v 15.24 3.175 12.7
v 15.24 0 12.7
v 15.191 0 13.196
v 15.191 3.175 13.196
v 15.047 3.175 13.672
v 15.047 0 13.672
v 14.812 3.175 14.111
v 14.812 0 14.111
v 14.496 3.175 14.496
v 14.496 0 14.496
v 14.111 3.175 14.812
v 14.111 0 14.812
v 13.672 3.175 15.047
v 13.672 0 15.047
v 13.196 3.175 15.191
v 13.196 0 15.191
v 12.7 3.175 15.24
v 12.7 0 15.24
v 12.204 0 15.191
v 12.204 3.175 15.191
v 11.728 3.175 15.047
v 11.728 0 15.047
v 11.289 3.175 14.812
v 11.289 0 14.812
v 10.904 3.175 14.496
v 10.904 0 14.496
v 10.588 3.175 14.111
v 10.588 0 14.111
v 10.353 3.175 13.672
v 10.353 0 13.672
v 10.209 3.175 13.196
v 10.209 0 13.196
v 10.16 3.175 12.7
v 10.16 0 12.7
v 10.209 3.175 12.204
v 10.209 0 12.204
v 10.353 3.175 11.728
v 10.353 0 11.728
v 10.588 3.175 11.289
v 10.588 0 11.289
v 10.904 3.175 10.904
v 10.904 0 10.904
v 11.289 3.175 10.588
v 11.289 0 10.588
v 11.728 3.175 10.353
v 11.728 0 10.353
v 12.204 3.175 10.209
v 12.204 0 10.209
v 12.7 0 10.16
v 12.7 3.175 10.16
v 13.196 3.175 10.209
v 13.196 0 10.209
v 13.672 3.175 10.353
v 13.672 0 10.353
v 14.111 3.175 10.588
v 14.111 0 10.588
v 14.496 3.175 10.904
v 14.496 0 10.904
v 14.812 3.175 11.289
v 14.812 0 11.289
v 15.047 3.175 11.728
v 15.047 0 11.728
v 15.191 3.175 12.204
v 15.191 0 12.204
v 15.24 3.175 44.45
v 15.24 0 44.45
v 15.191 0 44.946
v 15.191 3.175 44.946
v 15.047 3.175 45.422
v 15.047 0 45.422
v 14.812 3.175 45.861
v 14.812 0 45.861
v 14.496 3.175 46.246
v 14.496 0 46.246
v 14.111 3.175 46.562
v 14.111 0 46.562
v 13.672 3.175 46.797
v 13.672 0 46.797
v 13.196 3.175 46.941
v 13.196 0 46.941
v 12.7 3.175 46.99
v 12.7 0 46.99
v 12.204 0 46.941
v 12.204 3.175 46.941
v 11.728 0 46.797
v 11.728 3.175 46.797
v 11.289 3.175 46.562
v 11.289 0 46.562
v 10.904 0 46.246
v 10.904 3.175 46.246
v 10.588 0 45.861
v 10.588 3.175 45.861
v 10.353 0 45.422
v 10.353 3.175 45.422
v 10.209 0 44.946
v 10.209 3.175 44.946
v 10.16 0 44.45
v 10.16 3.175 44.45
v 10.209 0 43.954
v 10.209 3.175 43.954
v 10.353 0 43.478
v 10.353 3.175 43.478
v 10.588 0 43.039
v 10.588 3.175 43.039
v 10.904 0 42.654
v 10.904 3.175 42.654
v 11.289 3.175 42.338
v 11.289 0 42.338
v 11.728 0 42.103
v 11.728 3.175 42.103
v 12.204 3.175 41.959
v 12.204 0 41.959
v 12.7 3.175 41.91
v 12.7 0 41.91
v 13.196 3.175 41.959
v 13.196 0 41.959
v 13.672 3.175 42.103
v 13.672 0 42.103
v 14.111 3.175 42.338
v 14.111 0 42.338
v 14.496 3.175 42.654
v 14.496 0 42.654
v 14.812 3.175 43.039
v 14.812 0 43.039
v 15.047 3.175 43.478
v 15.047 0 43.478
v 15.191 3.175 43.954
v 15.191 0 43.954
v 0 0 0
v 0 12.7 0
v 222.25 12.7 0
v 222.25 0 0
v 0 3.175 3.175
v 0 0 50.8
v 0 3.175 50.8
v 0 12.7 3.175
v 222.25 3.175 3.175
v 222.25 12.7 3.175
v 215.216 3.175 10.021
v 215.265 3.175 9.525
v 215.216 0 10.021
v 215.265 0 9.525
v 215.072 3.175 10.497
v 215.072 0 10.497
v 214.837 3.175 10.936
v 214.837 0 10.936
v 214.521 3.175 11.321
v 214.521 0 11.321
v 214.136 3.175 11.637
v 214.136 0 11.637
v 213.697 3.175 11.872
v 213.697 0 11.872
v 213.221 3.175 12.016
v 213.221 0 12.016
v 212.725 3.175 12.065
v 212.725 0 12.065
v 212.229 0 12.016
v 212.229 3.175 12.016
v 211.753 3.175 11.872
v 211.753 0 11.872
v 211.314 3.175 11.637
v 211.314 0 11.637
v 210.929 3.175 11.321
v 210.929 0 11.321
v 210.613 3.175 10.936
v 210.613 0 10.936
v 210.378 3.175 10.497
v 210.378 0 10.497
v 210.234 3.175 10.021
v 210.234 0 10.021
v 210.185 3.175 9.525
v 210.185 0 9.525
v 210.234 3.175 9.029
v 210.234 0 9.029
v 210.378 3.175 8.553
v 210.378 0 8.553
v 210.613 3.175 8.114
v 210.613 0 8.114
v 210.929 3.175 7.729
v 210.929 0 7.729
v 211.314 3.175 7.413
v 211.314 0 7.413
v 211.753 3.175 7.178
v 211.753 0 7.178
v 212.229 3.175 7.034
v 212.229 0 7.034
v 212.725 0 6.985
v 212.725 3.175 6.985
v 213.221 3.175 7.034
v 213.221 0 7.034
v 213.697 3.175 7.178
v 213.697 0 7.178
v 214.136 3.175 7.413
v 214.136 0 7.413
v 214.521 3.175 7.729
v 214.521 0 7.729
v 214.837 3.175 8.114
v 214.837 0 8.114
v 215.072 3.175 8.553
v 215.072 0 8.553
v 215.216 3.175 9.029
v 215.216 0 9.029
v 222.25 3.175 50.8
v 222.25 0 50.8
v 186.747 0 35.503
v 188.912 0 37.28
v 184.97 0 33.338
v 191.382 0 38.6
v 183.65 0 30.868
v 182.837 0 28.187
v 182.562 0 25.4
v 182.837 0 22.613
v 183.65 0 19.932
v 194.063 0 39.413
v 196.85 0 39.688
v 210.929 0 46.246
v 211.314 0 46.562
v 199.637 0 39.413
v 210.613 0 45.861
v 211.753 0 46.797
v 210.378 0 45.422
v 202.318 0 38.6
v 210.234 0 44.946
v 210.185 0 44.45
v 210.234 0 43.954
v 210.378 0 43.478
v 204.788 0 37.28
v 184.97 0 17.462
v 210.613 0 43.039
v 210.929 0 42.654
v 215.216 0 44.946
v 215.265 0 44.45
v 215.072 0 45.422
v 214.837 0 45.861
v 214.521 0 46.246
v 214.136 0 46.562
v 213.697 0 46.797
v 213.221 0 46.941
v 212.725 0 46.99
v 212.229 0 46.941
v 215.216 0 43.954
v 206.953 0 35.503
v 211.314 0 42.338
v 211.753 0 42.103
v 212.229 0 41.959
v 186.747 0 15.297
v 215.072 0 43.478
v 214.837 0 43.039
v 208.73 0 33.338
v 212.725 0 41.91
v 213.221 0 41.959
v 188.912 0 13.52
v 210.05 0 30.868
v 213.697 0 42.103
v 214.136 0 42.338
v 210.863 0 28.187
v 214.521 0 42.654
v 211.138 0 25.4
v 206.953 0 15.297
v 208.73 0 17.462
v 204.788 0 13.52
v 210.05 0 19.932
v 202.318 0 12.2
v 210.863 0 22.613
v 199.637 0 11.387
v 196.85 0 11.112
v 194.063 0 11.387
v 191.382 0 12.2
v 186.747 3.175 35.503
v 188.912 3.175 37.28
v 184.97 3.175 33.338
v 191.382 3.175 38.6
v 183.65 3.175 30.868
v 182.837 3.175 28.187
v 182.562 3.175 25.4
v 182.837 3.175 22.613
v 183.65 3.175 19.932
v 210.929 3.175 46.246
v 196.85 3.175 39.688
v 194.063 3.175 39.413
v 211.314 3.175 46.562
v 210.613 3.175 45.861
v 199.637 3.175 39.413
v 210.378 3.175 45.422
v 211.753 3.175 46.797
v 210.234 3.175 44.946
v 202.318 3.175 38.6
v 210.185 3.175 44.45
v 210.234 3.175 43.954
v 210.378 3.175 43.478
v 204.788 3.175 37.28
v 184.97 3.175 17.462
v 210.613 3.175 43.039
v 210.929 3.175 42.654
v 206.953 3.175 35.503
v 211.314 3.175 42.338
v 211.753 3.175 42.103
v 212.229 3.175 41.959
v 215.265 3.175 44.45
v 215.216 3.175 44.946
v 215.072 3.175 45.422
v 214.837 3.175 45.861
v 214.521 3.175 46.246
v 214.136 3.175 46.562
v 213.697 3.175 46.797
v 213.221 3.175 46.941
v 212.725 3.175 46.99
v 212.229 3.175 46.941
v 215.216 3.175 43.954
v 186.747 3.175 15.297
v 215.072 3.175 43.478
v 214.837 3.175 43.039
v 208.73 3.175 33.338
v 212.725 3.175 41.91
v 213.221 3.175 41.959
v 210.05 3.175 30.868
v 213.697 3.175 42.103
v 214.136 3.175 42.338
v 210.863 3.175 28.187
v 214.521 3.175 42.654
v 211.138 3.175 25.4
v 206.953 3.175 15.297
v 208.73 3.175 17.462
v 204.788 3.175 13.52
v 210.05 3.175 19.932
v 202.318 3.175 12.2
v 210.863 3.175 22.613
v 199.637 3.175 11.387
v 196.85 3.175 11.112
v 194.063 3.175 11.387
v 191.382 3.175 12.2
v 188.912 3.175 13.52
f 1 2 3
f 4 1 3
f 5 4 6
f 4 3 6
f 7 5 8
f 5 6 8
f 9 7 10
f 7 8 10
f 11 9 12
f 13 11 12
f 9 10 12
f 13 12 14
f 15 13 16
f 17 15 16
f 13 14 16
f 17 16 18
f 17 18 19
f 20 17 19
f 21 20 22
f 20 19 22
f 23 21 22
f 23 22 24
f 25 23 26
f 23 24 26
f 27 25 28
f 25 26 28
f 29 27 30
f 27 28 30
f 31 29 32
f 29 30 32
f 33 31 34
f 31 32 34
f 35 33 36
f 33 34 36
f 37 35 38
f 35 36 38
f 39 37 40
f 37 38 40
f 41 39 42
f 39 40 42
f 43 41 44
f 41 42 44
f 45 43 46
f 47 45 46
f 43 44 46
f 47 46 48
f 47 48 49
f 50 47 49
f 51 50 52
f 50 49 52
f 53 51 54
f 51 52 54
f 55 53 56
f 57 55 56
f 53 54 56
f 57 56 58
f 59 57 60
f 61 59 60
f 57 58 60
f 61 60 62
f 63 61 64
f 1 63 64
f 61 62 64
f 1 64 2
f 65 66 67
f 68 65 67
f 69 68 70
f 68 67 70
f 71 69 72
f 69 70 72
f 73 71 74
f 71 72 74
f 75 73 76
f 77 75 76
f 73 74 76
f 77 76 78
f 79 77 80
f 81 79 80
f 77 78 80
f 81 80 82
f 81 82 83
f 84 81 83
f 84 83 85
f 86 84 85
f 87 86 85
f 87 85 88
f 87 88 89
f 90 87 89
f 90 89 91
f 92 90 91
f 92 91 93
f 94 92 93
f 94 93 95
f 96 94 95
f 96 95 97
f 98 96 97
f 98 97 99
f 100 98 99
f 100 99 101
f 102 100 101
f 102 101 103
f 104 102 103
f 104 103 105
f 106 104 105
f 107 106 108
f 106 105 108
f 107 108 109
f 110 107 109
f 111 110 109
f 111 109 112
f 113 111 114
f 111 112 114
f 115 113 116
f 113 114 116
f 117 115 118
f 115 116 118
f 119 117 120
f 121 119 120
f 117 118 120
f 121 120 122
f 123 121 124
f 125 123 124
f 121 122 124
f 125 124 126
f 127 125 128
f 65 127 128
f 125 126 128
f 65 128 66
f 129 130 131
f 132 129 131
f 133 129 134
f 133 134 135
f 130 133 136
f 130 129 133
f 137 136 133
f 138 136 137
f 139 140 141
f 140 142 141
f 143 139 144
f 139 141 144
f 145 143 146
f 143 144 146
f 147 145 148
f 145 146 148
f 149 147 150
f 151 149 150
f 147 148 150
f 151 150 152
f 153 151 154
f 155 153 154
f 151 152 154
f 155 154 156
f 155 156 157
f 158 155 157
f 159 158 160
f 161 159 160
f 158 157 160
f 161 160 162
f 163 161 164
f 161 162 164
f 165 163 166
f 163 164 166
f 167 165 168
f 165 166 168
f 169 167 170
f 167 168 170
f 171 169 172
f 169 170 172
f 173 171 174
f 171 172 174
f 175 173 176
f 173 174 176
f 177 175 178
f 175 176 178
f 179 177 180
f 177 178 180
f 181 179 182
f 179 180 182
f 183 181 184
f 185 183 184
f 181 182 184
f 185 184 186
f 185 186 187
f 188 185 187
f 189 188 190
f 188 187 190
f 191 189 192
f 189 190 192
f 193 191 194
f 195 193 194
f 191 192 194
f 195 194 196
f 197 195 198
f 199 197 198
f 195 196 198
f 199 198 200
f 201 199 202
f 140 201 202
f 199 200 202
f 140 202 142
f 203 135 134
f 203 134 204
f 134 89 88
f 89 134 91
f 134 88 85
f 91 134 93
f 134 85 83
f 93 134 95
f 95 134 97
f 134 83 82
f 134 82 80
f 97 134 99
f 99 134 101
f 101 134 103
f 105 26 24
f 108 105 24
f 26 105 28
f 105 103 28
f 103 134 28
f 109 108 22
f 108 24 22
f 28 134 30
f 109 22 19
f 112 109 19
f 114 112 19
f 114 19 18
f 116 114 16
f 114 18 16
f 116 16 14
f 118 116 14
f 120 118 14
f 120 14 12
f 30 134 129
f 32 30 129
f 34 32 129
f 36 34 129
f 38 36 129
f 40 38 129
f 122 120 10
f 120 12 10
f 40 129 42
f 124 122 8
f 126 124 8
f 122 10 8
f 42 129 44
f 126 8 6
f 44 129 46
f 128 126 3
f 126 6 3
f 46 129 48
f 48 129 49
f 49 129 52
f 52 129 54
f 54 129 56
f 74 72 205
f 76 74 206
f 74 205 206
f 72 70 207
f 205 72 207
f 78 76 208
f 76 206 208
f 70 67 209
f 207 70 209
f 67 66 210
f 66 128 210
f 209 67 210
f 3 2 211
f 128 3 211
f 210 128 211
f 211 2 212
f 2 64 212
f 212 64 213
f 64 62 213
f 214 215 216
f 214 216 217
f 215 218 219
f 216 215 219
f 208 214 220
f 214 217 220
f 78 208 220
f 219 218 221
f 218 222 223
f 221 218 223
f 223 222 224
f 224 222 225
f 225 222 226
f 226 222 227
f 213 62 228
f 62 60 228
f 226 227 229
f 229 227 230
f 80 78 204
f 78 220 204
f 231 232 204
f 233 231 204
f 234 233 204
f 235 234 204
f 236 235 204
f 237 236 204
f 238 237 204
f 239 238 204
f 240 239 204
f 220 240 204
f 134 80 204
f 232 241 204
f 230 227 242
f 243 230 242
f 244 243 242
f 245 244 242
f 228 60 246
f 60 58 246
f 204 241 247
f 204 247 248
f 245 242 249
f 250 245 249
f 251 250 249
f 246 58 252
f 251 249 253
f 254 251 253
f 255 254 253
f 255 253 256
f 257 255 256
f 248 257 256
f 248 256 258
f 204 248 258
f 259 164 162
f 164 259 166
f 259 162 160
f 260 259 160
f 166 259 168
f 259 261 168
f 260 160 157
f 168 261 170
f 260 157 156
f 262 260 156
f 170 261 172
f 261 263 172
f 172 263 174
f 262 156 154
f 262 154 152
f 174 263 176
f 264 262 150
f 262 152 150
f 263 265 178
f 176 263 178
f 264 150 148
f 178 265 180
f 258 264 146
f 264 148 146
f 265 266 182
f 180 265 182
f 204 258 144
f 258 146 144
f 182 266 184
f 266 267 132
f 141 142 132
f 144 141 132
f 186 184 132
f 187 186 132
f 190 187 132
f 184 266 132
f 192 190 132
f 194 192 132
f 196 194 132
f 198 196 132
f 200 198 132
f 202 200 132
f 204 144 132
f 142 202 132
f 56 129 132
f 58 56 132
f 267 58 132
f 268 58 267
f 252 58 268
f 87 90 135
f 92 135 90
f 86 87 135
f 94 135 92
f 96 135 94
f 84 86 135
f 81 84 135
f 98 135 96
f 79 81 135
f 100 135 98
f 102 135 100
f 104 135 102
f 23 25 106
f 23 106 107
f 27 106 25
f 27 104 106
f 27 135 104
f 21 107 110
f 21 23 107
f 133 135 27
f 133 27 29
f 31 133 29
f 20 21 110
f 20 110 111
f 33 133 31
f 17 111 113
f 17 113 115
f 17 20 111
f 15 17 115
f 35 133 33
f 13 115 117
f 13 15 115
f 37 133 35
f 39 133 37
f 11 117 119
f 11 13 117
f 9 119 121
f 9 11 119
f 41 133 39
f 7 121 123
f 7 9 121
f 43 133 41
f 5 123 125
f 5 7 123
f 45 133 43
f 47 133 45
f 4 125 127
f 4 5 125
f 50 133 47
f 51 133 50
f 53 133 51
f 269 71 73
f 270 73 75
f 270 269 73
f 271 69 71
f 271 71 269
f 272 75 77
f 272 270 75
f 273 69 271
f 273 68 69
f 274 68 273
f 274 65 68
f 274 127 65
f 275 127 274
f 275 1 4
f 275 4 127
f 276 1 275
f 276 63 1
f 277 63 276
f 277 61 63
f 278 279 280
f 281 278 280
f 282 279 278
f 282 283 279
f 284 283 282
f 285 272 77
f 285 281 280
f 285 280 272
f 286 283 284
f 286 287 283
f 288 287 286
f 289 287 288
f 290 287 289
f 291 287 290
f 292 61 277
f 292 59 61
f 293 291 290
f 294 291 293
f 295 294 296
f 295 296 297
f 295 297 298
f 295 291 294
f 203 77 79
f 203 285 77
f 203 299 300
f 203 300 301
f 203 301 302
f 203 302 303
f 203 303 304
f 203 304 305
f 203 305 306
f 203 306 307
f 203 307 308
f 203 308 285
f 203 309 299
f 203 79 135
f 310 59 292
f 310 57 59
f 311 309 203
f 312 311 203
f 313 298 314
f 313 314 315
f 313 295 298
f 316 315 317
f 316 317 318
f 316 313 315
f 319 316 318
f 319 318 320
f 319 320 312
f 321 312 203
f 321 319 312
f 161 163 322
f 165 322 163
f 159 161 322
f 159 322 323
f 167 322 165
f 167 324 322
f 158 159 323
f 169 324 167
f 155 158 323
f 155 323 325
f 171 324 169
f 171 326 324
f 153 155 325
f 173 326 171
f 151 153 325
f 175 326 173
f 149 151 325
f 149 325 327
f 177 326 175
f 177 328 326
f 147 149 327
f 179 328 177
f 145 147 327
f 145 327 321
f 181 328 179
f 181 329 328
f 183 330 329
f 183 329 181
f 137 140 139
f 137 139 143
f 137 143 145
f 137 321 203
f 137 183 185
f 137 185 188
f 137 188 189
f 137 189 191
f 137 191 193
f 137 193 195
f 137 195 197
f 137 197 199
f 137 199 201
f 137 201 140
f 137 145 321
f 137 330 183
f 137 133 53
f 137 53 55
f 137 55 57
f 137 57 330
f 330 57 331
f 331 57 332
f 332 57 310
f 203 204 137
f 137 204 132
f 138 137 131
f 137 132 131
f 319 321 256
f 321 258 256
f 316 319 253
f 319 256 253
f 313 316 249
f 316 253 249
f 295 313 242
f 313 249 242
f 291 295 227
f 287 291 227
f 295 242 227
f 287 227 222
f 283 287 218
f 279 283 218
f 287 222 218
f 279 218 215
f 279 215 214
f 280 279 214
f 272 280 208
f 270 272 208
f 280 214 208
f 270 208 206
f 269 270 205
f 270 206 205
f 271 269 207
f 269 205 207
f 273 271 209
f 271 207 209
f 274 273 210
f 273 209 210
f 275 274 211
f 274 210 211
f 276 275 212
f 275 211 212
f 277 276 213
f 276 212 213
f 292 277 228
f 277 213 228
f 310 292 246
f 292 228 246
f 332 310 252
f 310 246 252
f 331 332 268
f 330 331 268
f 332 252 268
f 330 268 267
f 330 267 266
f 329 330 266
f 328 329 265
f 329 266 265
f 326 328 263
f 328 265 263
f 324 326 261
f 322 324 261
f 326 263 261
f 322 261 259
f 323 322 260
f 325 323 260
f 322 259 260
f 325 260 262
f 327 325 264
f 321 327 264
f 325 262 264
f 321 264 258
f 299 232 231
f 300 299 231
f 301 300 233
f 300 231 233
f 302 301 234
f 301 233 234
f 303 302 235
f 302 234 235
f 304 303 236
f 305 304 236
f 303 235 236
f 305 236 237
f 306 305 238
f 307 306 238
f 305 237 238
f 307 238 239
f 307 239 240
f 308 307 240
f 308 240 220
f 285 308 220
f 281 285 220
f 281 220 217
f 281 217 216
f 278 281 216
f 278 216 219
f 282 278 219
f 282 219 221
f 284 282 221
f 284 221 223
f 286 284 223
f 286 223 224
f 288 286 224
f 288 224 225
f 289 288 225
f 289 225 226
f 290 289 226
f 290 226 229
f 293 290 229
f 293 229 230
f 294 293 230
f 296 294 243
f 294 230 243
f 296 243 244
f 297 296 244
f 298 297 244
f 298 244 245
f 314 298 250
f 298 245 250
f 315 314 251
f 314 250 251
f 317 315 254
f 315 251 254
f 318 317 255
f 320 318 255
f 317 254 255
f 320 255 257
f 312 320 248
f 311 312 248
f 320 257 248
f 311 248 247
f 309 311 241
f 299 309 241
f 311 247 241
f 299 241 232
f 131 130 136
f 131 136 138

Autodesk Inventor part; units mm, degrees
ref_plane "YZ Plane" through (0, 0, 0) normal (1, 0, 0) x (0, 1, 0)
ref_plane "XZ Plane" through (0, 0, 0) normal (0, 1, 0) x (-1, 0, 0)
ref_plane "XY Plane" through (0, 0, 0) normal (0, 0, 1) x (1, 0, 0)
sketch "Sketch1" plane through (0, 0, 0) normal (0, 0, 1) x (1, 0, 0)
  line L0 (0, 0) -> (222.25, 0)
  line L1 (0, 0) -> (0, 3.175)
  line L2 (0, 3.175) -> (222.25, 3.175)
  line L3 (0, 3.175) -> (0, 12.7)
  line L4 (0, 12.7) -> (222.25, 12.7)
  line L5 (222.25, 0) -> (222.25, 12.7)
  dimension "d4" = 3.175
  dimension "d9" = 12.7
  dimension "d11" = 222.25
extrude "Extrusion1" add sketch "Sketch1" along normal blind 3.175
extrude "Extrusion2" add sketch "Sketch1" along normal blind 50.8 contours L1 L2 L5 L0
sketch "Sketch2" plane through (0, 0, 0) normal (0, -1, 0) x (1, 0, 0)
  circle A0 centre (196.85, 25.4) radius 14.2875
  line L0 (0, 0) -> (0, 50.8) projected
  line L1 (0, 0) -> (222.25, 0) projected
  line L2 (222.25, 0) -> (222.25, 50.8) projected
  line L3 (222.25, 50.8) -> (0, 50.8) projected
  circle A1 centre (12.7, 44.45) radius 2.54
  circle A2 centre (12.7, 12.7) radius 2.54
  circle A3 centre (212.725, 44.45) radius 2.54
  circle A4 centre (212.725, 9.525) radius 2.54
  dimension "d26" = 25.4
  dimension "d27" = 25.4
  dimension "d28" = 28.575
  dimension "d29" = 5.08
  dimension "d30" = 12.7
  dimension "d31" = 6.35
  dimension "d32" = 12.7
  dimension "d33" = 12.7
  dimension "d34" = 6.35
  dimension "d35" = 9.525
  dimension "d36" = 9.525
  dimension "d37" = 9.525
extrude "Extrusion3" cut sketch "Sketch2" against normal through all contours A0 | A1 | A2 | A3 | A4
equation "\"d4\" = d6"
equation "\"d30\" = d32"
equation "\"d34\" = d31"
equation "\"d36\" = d35"
equation "\"d6\" = 3.175"
properties part number "8 ball bottom 1 by 2 L short"
